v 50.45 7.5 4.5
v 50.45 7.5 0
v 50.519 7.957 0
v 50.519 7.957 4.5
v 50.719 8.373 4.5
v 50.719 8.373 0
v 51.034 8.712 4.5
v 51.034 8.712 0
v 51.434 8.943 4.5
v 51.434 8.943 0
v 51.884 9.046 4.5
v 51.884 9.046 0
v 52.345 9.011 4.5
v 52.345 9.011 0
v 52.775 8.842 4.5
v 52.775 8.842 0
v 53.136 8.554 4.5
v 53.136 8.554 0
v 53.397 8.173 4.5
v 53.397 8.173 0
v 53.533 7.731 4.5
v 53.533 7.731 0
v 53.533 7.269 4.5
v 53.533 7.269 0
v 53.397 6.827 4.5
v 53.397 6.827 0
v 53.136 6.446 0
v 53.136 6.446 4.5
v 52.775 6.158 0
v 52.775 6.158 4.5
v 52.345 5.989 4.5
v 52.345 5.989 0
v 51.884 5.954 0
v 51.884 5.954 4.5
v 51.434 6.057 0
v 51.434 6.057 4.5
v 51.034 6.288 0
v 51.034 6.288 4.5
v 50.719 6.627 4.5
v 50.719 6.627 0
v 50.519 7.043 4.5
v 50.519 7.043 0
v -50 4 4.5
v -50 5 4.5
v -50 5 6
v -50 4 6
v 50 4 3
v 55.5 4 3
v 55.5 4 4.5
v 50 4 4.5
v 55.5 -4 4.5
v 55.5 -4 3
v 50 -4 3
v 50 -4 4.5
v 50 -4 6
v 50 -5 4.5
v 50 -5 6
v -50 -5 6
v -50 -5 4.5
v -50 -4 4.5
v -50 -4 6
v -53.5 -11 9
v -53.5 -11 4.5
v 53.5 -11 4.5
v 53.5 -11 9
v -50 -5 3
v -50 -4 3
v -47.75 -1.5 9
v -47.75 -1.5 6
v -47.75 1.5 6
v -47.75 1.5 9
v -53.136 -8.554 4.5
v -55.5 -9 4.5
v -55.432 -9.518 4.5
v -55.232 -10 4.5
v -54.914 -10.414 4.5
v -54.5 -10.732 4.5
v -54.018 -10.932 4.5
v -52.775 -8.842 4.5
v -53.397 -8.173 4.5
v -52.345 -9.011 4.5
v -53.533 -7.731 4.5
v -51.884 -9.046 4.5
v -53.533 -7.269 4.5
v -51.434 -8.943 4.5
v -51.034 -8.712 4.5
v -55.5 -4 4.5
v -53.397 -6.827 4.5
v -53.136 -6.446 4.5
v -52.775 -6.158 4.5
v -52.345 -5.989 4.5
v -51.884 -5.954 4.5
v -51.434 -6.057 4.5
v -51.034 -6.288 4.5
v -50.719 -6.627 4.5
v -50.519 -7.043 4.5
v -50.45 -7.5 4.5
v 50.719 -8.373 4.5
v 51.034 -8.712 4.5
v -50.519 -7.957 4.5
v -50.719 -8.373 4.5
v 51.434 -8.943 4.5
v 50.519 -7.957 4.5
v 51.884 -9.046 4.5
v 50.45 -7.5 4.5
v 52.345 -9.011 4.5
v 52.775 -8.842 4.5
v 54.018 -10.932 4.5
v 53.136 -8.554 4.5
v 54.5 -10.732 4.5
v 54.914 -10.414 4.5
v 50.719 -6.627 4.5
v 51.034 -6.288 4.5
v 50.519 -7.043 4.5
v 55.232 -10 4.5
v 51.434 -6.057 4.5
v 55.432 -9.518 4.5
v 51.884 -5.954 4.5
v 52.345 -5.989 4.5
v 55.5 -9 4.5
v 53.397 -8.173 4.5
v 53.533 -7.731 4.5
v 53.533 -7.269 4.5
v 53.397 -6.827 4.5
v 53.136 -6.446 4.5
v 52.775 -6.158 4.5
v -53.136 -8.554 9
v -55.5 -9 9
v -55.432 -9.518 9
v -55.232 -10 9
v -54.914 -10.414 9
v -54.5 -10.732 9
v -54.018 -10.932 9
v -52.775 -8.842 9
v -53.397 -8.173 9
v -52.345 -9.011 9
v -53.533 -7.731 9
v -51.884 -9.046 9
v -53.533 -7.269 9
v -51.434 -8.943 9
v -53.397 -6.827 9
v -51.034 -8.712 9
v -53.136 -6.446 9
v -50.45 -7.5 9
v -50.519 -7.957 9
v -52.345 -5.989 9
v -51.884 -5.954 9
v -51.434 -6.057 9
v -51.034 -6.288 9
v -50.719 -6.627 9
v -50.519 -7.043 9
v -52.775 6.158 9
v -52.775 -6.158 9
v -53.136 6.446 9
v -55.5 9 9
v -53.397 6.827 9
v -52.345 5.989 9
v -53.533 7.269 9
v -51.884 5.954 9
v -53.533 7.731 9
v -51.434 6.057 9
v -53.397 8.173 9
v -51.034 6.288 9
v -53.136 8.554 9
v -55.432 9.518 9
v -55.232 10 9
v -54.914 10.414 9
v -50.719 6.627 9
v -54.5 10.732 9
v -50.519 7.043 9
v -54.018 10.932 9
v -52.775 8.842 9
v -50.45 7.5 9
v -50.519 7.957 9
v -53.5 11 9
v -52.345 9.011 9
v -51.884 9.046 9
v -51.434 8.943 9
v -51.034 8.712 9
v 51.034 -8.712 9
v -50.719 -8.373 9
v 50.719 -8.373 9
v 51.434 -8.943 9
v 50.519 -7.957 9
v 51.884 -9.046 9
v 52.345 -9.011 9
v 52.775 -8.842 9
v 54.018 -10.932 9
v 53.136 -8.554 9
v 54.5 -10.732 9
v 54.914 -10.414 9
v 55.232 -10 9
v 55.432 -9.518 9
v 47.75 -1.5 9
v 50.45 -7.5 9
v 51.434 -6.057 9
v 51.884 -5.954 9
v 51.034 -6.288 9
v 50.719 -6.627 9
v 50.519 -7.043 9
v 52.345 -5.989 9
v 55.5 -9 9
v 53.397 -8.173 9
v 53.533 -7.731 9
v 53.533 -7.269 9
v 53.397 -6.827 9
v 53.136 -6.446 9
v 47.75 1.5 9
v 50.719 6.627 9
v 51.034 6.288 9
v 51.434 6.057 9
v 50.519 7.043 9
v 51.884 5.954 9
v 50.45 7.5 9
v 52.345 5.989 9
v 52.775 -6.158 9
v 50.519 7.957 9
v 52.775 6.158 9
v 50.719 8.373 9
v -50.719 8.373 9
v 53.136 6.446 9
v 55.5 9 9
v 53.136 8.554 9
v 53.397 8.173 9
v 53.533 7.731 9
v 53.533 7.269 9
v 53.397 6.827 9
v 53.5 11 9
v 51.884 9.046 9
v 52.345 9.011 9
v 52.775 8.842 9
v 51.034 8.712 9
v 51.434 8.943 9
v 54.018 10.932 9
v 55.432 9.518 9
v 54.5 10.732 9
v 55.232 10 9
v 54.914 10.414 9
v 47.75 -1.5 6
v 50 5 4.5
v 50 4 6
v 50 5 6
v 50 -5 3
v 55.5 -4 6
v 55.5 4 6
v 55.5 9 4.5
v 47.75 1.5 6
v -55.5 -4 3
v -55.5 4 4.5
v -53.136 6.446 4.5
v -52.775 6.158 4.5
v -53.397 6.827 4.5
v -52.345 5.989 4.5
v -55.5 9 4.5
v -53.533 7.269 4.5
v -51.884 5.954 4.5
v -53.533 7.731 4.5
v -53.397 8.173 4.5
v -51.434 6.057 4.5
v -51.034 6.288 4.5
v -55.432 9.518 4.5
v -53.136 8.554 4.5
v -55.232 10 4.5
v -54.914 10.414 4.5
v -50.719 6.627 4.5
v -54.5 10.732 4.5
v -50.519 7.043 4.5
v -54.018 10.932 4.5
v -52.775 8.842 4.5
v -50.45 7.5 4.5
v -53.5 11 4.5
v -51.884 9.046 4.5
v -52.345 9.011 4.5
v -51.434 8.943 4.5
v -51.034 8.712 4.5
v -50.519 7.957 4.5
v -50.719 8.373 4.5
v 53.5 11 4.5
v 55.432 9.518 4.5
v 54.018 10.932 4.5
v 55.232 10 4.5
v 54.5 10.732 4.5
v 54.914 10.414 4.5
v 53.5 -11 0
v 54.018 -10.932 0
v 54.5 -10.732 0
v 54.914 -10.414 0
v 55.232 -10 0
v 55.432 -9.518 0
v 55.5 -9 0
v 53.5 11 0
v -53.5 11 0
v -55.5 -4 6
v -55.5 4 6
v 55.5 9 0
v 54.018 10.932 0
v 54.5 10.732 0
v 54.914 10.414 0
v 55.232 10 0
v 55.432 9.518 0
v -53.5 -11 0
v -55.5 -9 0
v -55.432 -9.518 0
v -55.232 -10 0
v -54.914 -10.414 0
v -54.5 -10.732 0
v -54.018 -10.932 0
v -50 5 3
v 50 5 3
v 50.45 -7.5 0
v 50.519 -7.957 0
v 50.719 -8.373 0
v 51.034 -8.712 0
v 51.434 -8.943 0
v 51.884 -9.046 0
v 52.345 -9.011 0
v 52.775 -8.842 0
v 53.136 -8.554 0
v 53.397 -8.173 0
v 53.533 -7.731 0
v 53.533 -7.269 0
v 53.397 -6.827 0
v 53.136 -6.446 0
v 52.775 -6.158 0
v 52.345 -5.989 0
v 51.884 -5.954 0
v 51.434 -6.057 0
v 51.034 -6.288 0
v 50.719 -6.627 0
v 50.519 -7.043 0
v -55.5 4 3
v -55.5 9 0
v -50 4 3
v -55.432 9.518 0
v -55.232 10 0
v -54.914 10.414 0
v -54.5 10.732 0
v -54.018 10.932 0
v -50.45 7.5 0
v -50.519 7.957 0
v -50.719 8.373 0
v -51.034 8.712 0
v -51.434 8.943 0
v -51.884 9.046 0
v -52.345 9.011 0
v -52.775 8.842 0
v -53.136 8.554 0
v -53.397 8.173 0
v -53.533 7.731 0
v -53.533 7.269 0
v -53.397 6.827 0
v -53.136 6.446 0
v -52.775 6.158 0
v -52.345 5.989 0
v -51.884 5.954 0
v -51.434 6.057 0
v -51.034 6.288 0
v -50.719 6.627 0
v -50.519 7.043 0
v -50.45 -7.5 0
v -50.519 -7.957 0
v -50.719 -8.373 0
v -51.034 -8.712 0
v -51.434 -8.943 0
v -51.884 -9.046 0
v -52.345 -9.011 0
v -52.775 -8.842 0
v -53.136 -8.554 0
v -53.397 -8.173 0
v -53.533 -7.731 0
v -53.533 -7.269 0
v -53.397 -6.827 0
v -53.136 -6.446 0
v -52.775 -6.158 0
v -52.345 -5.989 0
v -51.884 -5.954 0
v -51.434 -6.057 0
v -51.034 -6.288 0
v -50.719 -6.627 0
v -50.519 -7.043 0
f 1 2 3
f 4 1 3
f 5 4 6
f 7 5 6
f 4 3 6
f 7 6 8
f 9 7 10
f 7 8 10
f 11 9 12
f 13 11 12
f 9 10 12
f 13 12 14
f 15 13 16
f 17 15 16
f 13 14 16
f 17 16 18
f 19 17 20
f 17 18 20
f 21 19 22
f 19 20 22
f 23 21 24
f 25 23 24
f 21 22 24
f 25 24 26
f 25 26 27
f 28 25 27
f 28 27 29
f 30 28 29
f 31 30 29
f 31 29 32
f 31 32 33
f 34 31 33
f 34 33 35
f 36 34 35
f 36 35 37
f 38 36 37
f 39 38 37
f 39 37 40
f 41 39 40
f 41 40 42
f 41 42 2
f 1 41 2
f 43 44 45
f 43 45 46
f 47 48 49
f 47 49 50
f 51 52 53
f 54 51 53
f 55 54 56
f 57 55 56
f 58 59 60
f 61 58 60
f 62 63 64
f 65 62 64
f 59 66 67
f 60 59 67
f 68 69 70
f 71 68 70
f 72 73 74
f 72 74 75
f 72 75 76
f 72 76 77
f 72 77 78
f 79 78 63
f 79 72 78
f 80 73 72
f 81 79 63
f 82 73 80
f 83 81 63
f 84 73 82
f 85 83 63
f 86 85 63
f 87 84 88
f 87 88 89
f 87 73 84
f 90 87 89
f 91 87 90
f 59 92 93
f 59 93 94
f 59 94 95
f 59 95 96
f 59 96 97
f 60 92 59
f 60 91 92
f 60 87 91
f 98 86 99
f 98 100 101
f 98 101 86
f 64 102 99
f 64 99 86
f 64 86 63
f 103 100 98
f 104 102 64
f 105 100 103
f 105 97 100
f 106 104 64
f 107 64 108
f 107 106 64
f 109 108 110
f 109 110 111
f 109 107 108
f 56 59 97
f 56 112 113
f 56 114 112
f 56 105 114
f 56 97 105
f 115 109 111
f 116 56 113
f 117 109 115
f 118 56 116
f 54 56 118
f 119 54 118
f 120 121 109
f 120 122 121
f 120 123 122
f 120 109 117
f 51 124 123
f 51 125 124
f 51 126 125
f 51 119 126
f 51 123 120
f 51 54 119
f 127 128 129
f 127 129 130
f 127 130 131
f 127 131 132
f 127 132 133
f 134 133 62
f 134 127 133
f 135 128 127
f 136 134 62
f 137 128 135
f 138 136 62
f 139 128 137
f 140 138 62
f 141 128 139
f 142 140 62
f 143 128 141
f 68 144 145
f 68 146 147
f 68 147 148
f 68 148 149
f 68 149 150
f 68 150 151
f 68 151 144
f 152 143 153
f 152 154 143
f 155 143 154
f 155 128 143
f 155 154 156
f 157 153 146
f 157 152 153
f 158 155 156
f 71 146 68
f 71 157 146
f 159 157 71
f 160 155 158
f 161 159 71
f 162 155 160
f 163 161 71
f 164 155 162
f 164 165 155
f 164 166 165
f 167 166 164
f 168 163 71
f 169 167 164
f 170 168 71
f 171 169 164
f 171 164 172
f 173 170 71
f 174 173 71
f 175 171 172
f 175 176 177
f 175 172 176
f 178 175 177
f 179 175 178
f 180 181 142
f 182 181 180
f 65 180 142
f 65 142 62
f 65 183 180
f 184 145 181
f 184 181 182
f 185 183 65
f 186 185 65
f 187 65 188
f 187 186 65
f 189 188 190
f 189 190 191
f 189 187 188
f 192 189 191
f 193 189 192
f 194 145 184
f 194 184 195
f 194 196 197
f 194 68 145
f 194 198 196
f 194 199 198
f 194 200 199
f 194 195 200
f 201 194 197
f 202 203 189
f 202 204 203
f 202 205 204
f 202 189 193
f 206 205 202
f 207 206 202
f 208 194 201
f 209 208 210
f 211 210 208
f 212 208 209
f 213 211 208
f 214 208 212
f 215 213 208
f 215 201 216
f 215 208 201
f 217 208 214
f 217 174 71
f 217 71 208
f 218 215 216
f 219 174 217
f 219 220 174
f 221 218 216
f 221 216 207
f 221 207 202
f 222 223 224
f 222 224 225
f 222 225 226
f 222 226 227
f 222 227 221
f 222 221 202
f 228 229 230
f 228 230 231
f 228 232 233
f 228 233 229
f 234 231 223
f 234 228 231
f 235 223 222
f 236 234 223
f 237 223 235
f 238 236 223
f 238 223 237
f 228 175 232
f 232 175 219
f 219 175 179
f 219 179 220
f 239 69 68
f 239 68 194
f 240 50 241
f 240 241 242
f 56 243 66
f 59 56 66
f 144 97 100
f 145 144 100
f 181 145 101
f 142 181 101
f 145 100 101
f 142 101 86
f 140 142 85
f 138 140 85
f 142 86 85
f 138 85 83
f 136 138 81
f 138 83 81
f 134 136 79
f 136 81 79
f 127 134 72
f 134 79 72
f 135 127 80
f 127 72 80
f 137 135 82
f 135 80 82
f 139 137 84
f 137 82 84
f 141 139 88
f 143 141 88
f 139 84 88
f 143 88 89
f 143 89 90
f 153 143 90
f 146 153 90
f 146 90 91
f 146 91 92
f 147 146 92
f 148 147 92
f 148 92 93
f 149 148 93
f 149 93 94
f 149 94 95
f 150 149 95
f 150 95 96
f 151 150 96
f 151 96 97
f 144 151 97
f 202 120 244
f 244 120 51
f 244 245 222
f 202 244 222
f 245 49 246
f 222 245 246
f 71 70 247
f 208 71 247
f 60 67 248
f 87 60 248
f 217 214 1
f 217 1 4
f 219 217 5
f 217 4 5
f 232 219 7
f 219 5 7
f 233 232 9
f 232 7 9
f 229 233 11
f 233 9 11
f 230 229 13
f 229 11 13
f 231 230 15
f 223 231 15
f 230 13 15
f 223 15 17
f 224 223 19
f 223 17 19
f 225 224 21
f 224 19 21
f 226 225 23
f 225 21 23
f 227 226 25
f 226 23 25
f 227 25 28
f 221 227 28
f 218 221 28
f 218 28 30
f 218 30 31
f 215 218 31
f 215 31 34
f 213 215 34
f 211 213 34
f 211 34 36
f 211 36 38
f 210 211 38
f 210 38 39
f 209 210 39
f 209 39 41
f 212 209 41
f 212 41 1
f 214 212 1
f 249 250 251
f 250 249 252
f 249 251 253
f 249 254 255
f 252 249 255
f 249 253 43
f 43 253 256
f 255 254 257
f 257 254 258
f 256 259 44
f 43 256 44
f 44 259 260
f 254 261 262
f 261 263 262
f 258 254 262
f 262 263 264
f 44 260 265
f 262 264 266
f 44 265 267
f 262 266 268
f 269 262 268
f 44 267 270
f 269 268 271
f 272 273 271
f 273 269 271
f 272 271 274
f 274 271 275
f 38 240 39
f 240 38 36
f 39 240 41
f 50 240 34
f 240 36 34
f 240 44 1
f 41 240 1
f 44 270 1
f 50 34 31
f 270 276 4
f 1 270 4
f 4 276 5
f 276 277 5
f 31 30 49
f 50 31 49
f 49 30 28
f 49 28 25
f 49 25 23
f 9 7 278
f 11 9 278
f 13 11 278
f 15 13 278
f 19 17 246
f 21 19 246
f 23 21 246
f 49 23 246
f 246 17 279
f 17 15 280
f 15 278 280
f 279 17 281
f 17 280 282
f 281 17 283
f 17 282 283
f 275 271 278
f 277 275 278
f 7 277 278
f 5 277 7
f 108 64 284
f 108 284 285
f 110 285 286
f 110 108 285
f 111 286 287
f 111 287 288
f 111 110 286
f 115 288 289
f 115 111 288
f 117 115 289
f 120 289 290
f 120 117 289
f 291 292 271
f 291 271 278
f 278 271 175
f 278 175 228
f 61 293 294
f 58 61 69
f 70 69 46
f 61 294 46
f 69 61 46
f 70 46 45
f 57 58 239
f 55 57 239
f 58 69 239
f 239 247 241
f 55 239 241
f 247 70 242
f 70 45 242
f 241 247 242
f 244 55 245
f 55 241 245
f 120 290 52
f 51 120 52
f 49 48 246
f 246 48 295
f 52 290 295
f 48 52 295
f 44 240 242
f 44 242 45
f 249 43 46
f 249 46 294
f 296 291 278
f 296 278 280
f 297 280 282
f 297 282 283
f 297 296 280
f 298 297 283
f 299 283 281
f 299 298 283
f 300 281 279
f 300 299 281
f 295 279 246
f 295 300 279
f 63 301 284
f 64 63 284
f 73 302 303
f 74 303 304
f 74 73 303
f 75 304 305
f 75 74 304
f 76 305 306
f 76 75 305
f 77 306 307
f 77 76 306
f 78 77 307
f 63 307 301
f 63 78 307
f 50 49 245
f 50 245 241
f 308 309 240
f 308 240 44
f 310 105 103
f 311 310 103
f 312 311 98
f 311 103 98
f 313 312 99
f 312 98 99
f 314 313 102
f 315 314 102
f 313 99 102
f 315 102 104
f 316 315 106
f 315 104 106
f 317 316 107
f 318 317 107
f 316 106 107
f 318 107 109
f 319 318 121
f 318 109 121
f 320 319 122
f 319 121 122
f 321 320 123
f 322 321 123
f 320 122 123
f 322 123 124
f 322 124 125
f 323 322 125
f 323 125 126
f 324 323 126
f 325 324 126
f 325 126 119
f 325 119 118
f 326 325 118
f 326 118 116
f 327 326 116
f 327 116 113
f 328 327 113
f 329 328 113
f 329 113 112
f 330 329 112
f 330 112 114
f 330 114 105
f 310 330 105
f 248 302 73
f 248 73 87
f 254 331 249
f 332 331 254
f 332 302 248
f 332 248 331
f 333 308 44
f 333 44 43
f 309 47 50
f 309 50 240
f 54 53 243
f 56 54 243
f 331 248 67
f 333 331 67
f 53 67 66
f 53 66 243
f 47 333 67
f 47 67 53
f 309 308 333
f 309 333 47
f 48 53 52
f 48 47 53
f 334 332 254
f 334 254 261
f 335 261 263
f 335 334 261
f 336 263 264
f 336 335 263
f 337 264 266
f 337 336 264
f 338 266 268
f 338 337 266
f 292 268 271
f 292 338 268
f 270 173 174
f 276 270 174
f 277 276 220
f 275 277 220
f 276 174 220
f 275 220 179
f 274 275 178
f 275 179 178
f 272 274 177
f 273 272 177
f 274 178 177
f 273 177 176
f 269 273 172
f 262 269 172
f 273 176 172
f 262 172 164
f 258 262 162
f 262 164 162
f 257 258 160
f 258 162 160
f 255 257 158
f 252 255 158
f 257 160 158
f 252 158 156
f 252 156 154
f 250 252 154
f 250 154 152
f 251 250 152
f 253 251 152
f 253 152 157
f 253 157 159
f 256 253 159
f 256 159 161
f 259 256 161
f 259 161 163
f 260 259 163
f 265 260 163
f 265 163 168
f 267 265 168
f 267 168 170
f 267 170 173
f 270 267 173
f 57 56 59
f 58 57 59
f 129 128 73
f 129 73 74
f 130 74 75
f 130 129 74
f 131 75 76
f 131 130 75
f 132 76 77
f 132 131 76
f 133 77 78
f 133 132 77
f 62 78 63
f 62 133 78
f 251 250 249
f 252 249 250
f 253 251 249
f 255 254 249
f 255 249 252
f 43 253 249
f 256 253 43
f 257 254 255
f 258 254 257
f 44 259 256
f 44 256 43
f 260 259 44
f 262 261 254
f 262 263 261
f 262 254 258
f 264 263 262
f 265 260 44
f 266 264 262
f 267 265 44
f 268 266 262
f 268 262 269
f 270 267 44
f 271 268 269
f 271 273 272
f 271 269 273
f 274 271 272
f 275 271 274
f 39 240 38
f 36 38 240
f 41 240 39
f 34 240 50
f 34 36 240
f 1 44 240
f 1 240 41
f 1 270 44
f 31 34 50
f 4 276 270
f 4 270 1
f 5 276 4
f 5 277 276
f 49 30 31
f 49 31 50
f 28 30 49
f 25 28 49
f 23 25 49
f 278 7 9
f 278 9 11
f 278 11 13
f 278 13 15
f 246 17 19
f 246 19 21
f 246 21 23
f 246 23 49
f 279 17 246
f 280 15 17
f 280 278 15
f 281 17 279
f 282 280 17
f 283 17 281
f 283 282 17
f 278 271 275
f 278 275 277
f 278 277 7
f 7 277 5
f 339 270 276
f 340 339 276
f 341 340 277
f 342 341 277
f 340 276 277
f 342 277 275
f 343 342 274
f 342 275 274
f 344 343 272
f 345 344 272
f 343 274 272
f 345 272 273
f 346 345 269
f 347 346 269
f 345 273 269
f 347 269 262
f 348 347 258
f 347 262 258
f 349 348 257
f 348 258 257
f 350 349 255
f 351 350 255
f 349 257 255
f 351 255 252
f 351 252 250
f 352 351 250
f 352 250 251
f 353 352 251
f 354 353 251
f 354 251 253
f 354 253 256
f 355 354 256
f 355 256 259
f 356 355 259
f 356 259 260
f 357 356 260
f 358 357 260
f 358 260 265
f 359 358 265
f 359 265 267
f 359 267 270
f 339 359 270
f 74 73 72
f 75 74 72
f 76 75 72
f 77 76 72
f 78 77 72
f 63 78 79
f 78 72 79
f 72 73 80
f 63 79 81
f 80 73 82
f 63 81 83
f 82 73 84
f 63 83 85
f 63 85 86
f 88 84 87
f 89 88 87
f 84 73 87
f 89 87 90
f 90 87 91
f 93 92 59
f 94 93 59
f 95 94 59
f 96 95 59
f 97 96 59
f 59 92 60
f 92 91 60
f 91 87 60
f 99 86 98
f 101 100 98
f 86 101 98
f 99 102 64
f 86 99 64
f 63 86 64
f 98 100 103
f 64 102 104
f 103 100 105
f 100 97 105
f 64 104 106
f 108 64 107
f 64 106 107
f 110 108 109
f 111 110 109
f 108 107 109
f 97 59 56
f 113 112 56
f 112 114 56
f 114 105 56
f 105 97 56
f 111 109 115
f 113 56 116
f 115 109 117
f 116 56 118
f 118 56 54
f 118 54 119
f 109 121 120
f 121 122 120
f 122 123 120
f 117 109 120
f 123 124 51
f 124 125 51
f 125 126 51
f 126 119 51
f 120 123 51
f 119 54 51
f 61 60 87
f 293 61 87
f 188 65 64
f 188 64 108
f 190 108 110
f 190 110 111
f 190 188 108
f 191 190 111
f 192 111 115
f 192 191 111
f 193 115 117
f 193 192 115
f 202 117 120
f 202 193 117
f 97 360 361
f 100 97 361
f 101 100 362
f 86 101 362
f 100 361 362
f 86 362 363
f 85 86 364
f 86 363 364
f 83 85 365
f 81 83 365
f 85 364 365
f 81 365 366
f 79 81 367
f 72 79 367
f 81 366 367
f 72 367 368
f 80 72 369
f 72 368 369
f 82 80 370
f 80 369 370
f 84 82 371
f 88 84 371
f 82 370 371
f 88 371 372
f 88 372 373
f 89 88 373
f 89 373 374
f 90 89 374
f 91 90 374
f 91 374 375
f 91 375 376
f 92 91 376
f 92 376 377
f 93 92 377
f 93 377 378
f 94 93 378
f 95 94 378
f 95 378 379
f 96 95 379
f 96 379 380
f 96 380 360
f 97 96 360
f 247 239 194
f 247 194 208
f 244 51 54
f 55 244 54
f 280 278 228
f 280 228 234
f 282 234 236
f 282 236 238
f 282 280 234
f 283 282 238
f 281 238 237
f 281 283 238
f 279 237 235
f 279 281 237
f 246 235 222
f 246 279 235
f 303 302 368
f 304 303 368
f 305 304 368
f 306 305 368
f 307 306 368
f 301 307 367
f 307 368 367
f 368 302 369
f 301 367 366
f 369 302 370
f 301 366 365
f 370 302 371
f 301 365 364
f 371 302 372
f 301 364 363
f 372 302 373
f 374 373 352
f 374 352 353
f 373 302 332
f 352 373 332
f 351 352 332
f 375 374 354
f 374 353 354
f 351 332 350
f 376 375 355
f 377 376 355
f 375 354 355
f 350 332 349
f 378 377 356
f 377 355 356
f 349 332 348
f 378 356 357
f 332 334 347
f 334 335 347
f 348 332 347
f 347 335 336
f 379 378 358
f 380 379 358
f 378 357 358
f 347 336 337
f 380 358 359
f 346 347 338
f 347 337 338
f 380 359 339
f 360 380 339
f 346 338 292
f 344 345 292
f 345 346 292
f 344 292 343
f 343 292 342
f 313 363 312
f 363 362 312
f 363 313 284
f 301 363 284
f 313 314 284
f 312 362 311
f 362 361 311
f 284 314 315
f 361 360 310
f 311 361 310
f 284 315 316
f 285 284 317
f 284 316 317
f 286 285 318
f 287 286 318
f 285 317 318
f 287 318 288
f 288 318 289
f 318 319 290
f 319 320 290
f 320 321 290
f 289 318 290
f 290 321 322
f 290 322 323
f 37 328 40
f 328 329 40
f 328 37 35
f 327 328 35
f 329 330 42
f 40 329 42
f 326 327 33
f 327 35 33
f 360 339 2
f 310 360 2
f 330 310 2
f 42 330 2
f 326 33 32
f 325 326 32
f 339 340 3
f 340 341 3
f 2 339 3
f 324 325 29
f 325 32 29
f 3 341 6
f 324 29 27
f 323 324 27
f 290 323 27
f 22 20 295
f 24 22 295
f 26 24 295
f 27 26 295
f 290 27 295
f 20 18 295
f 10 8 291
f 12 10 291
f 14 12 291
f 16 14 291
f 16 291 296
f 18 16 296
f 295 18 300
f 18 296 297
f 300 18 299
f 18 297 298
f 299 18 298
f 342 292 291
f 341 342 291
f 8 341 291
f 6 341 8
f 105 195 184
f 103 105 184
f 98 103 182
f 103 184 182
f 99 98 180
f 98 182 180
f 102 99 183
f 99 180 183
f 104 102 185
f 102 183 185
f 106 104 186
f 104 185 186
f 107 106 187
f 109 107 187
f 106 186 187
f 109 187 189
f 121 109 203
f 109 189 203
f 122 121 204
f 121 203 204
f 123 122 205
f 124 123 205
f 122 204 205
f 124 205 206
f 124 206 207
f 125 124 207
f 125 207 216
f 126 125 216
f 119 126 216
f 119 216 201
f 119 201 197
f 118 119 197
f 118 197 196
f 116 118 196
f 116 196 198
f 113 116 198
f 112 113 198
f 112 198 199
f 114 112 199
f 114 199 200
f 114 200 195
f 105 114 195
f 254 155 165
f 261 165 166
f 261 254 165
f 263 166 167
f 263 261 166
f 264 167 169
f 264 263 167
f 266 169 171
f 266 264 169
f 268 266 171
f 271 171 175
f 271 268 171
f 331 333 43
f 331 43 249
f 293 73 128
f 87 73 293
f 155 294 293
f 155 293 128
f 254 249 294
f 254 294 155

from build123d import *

# Parameters (mm, degrees)
BOX_BOTTOM_HALF_0_W     = 113
BOX_BOTTOM_HALF_0_H     = 24
BOX_BOTTOM_HALF_0_DEPTH = 5.5
SKETCH_W                = 111
SKETCH_H                = 22
PAD_DEPTH               = 3
PAD001_DEPTH            = 3
SKETCH002_W             = 111
SKETCH002_H             = 22
SKETCH002_W_2           = 95.5
SKETCH002_H_2           = 3
PAD002_DEPTH            = 3
SKETCH003_R             = 1.55
POCKET_DEPTH            = 236.034037
POLARPATTERN_COUNT      = 2
POLARPATTERN001_COUNT   = 2
POLARPATTERN002_COUNT   = 2
FILLET_R                = 2


with BuildPart() as box_bottom_half_0_body:
    # box_bottom_half_0 → box_bottom_half_0 (new body)
    with BuildSketch(Plane(origin=(-56.5, -12, -1), x_dir=(1, 0, 0), z_dir=(0, 0, 1))):
        with Locations((56.5, 12)):
            Rectangle(BOX_BOTTOM_HALF_0_W, BOX_BOTTOM_HALF_0_H)
    extrude(amount=BOX_BOTTOM_HALF_0_DEPTH)


with BuildPart() as body:
    # Sketch → Pad (new body)
    with BuildSketch(Plane.XY):
        Rectangle(SKETCH_W, SKETCH_H)
    extrude(amount=PAD_DEPTH)

    # Sketch001 (on Face6 of Pad) → Pad001 (join)
    with BuildSketch(Plane.XY.offset(3)):
        Polygon((-55.5, 11), (55.5, 11), (55.5, 4), (50, 4), (50, 5), (-50, 5), (-50, 4), (-55.5, 4), align=None)
        Polygon((-55.5, -11), (55.5, -11), (55.5, -4), (50, -4), (50, -5), (-50, -5), (-50, -4), (-55.5, -4), align=None)
    extrude(amount=PAD001_DEPTH)

    # Sketch002 (on Face12 of Pad001) → Pad002 (join)
    with BuildSketch(Plane.XY.offset(6)):
        Rectangle(SKETCH002_W, SKETCH002_H)
        Rectangle(SKETCH002_W_2, SKETCH002_H_2, mode=Mode.SUBTRACT)
    extrude(amount=PAD002_DEPTH)

    # Sketch003 (on Face26 of Pad002) → Pocket (cut, through all)
    with BuildSketch(Plane.XY.offset(9)):
        with Locations((-52, 7.5)):
            Circle(SKETCH003_R)
    pocket = extrude(amount=-POCKET_DEPTH, mode=Mode.SUBTRACT)

    # PolarPattern: Pocket ×2 about axis
    polarpattern_axis = Axis((0, 0, 0), (0, 1, 0))
    for i in range(1, POLARPATTERN_COUNT):
        add(pocket.rotate(polarpattern_axis, i * 360 / POLARPATTERN_COUNT), mode=Mode.SUBTRACT)

    # PolarPattern001: Pocket ×2 about axis
    polarpattern001_axis = Axis((0, 0, 0), (1, 0, 0))
    for i in range(1, POLARPATTERN001_COUNT):
        add(pocket.rotate(polarpattern001_axis, i * 360 / POLARPATTERN001_COUNT), mode=Mode.SUBTRACT)

    # PolarPattern002: Pocket ×2 about axis
    polarpattern002_axis = Axis((0, 0, 9), (0, 0, 1))
    for i in range(1, POLARPATTERN002_COUNT):
        add(pocket.rotate(polarpattern002_axis, i * 360 / POLARPATTERN002_COUNT), mode=Mode.SUBTRACT)

    # Fillet
    fillet_edges = [body.edges().sort_by_distance(p)[0] for p in [
        (55.5, 11, 7.5),
        (55.5, 11, 4.5),
        (55.5, 11, 1.5),
        (55.5, -11, 7.5),
        (-55.5, 11, 7.5),
        (-55.5, -11, 7.5),
    ]]
    fillet(fillet_edges, radius=FILLET_R)


with BuildPart() as bottom_half_0_body:
    # bottom_half_0 base: copy of Body
    add(body.part)

    # bottom_half_0: intersect box_bottom_half_0 body
    add(box_bottom_half_0_body.part, mode=Mode.INTERSECT)


with BuildPart() as top_half_0_body:
    # top_half_0 base: copy of Body
    add(body.part)

    # top_half_0: cut box_bottom_half_0 body
    add(box_bottom_half_0_body.part, mode=Mode.SUBTRACT)


solid = Compound([bottom_half_0_body.part, top_half_0_body.part])
